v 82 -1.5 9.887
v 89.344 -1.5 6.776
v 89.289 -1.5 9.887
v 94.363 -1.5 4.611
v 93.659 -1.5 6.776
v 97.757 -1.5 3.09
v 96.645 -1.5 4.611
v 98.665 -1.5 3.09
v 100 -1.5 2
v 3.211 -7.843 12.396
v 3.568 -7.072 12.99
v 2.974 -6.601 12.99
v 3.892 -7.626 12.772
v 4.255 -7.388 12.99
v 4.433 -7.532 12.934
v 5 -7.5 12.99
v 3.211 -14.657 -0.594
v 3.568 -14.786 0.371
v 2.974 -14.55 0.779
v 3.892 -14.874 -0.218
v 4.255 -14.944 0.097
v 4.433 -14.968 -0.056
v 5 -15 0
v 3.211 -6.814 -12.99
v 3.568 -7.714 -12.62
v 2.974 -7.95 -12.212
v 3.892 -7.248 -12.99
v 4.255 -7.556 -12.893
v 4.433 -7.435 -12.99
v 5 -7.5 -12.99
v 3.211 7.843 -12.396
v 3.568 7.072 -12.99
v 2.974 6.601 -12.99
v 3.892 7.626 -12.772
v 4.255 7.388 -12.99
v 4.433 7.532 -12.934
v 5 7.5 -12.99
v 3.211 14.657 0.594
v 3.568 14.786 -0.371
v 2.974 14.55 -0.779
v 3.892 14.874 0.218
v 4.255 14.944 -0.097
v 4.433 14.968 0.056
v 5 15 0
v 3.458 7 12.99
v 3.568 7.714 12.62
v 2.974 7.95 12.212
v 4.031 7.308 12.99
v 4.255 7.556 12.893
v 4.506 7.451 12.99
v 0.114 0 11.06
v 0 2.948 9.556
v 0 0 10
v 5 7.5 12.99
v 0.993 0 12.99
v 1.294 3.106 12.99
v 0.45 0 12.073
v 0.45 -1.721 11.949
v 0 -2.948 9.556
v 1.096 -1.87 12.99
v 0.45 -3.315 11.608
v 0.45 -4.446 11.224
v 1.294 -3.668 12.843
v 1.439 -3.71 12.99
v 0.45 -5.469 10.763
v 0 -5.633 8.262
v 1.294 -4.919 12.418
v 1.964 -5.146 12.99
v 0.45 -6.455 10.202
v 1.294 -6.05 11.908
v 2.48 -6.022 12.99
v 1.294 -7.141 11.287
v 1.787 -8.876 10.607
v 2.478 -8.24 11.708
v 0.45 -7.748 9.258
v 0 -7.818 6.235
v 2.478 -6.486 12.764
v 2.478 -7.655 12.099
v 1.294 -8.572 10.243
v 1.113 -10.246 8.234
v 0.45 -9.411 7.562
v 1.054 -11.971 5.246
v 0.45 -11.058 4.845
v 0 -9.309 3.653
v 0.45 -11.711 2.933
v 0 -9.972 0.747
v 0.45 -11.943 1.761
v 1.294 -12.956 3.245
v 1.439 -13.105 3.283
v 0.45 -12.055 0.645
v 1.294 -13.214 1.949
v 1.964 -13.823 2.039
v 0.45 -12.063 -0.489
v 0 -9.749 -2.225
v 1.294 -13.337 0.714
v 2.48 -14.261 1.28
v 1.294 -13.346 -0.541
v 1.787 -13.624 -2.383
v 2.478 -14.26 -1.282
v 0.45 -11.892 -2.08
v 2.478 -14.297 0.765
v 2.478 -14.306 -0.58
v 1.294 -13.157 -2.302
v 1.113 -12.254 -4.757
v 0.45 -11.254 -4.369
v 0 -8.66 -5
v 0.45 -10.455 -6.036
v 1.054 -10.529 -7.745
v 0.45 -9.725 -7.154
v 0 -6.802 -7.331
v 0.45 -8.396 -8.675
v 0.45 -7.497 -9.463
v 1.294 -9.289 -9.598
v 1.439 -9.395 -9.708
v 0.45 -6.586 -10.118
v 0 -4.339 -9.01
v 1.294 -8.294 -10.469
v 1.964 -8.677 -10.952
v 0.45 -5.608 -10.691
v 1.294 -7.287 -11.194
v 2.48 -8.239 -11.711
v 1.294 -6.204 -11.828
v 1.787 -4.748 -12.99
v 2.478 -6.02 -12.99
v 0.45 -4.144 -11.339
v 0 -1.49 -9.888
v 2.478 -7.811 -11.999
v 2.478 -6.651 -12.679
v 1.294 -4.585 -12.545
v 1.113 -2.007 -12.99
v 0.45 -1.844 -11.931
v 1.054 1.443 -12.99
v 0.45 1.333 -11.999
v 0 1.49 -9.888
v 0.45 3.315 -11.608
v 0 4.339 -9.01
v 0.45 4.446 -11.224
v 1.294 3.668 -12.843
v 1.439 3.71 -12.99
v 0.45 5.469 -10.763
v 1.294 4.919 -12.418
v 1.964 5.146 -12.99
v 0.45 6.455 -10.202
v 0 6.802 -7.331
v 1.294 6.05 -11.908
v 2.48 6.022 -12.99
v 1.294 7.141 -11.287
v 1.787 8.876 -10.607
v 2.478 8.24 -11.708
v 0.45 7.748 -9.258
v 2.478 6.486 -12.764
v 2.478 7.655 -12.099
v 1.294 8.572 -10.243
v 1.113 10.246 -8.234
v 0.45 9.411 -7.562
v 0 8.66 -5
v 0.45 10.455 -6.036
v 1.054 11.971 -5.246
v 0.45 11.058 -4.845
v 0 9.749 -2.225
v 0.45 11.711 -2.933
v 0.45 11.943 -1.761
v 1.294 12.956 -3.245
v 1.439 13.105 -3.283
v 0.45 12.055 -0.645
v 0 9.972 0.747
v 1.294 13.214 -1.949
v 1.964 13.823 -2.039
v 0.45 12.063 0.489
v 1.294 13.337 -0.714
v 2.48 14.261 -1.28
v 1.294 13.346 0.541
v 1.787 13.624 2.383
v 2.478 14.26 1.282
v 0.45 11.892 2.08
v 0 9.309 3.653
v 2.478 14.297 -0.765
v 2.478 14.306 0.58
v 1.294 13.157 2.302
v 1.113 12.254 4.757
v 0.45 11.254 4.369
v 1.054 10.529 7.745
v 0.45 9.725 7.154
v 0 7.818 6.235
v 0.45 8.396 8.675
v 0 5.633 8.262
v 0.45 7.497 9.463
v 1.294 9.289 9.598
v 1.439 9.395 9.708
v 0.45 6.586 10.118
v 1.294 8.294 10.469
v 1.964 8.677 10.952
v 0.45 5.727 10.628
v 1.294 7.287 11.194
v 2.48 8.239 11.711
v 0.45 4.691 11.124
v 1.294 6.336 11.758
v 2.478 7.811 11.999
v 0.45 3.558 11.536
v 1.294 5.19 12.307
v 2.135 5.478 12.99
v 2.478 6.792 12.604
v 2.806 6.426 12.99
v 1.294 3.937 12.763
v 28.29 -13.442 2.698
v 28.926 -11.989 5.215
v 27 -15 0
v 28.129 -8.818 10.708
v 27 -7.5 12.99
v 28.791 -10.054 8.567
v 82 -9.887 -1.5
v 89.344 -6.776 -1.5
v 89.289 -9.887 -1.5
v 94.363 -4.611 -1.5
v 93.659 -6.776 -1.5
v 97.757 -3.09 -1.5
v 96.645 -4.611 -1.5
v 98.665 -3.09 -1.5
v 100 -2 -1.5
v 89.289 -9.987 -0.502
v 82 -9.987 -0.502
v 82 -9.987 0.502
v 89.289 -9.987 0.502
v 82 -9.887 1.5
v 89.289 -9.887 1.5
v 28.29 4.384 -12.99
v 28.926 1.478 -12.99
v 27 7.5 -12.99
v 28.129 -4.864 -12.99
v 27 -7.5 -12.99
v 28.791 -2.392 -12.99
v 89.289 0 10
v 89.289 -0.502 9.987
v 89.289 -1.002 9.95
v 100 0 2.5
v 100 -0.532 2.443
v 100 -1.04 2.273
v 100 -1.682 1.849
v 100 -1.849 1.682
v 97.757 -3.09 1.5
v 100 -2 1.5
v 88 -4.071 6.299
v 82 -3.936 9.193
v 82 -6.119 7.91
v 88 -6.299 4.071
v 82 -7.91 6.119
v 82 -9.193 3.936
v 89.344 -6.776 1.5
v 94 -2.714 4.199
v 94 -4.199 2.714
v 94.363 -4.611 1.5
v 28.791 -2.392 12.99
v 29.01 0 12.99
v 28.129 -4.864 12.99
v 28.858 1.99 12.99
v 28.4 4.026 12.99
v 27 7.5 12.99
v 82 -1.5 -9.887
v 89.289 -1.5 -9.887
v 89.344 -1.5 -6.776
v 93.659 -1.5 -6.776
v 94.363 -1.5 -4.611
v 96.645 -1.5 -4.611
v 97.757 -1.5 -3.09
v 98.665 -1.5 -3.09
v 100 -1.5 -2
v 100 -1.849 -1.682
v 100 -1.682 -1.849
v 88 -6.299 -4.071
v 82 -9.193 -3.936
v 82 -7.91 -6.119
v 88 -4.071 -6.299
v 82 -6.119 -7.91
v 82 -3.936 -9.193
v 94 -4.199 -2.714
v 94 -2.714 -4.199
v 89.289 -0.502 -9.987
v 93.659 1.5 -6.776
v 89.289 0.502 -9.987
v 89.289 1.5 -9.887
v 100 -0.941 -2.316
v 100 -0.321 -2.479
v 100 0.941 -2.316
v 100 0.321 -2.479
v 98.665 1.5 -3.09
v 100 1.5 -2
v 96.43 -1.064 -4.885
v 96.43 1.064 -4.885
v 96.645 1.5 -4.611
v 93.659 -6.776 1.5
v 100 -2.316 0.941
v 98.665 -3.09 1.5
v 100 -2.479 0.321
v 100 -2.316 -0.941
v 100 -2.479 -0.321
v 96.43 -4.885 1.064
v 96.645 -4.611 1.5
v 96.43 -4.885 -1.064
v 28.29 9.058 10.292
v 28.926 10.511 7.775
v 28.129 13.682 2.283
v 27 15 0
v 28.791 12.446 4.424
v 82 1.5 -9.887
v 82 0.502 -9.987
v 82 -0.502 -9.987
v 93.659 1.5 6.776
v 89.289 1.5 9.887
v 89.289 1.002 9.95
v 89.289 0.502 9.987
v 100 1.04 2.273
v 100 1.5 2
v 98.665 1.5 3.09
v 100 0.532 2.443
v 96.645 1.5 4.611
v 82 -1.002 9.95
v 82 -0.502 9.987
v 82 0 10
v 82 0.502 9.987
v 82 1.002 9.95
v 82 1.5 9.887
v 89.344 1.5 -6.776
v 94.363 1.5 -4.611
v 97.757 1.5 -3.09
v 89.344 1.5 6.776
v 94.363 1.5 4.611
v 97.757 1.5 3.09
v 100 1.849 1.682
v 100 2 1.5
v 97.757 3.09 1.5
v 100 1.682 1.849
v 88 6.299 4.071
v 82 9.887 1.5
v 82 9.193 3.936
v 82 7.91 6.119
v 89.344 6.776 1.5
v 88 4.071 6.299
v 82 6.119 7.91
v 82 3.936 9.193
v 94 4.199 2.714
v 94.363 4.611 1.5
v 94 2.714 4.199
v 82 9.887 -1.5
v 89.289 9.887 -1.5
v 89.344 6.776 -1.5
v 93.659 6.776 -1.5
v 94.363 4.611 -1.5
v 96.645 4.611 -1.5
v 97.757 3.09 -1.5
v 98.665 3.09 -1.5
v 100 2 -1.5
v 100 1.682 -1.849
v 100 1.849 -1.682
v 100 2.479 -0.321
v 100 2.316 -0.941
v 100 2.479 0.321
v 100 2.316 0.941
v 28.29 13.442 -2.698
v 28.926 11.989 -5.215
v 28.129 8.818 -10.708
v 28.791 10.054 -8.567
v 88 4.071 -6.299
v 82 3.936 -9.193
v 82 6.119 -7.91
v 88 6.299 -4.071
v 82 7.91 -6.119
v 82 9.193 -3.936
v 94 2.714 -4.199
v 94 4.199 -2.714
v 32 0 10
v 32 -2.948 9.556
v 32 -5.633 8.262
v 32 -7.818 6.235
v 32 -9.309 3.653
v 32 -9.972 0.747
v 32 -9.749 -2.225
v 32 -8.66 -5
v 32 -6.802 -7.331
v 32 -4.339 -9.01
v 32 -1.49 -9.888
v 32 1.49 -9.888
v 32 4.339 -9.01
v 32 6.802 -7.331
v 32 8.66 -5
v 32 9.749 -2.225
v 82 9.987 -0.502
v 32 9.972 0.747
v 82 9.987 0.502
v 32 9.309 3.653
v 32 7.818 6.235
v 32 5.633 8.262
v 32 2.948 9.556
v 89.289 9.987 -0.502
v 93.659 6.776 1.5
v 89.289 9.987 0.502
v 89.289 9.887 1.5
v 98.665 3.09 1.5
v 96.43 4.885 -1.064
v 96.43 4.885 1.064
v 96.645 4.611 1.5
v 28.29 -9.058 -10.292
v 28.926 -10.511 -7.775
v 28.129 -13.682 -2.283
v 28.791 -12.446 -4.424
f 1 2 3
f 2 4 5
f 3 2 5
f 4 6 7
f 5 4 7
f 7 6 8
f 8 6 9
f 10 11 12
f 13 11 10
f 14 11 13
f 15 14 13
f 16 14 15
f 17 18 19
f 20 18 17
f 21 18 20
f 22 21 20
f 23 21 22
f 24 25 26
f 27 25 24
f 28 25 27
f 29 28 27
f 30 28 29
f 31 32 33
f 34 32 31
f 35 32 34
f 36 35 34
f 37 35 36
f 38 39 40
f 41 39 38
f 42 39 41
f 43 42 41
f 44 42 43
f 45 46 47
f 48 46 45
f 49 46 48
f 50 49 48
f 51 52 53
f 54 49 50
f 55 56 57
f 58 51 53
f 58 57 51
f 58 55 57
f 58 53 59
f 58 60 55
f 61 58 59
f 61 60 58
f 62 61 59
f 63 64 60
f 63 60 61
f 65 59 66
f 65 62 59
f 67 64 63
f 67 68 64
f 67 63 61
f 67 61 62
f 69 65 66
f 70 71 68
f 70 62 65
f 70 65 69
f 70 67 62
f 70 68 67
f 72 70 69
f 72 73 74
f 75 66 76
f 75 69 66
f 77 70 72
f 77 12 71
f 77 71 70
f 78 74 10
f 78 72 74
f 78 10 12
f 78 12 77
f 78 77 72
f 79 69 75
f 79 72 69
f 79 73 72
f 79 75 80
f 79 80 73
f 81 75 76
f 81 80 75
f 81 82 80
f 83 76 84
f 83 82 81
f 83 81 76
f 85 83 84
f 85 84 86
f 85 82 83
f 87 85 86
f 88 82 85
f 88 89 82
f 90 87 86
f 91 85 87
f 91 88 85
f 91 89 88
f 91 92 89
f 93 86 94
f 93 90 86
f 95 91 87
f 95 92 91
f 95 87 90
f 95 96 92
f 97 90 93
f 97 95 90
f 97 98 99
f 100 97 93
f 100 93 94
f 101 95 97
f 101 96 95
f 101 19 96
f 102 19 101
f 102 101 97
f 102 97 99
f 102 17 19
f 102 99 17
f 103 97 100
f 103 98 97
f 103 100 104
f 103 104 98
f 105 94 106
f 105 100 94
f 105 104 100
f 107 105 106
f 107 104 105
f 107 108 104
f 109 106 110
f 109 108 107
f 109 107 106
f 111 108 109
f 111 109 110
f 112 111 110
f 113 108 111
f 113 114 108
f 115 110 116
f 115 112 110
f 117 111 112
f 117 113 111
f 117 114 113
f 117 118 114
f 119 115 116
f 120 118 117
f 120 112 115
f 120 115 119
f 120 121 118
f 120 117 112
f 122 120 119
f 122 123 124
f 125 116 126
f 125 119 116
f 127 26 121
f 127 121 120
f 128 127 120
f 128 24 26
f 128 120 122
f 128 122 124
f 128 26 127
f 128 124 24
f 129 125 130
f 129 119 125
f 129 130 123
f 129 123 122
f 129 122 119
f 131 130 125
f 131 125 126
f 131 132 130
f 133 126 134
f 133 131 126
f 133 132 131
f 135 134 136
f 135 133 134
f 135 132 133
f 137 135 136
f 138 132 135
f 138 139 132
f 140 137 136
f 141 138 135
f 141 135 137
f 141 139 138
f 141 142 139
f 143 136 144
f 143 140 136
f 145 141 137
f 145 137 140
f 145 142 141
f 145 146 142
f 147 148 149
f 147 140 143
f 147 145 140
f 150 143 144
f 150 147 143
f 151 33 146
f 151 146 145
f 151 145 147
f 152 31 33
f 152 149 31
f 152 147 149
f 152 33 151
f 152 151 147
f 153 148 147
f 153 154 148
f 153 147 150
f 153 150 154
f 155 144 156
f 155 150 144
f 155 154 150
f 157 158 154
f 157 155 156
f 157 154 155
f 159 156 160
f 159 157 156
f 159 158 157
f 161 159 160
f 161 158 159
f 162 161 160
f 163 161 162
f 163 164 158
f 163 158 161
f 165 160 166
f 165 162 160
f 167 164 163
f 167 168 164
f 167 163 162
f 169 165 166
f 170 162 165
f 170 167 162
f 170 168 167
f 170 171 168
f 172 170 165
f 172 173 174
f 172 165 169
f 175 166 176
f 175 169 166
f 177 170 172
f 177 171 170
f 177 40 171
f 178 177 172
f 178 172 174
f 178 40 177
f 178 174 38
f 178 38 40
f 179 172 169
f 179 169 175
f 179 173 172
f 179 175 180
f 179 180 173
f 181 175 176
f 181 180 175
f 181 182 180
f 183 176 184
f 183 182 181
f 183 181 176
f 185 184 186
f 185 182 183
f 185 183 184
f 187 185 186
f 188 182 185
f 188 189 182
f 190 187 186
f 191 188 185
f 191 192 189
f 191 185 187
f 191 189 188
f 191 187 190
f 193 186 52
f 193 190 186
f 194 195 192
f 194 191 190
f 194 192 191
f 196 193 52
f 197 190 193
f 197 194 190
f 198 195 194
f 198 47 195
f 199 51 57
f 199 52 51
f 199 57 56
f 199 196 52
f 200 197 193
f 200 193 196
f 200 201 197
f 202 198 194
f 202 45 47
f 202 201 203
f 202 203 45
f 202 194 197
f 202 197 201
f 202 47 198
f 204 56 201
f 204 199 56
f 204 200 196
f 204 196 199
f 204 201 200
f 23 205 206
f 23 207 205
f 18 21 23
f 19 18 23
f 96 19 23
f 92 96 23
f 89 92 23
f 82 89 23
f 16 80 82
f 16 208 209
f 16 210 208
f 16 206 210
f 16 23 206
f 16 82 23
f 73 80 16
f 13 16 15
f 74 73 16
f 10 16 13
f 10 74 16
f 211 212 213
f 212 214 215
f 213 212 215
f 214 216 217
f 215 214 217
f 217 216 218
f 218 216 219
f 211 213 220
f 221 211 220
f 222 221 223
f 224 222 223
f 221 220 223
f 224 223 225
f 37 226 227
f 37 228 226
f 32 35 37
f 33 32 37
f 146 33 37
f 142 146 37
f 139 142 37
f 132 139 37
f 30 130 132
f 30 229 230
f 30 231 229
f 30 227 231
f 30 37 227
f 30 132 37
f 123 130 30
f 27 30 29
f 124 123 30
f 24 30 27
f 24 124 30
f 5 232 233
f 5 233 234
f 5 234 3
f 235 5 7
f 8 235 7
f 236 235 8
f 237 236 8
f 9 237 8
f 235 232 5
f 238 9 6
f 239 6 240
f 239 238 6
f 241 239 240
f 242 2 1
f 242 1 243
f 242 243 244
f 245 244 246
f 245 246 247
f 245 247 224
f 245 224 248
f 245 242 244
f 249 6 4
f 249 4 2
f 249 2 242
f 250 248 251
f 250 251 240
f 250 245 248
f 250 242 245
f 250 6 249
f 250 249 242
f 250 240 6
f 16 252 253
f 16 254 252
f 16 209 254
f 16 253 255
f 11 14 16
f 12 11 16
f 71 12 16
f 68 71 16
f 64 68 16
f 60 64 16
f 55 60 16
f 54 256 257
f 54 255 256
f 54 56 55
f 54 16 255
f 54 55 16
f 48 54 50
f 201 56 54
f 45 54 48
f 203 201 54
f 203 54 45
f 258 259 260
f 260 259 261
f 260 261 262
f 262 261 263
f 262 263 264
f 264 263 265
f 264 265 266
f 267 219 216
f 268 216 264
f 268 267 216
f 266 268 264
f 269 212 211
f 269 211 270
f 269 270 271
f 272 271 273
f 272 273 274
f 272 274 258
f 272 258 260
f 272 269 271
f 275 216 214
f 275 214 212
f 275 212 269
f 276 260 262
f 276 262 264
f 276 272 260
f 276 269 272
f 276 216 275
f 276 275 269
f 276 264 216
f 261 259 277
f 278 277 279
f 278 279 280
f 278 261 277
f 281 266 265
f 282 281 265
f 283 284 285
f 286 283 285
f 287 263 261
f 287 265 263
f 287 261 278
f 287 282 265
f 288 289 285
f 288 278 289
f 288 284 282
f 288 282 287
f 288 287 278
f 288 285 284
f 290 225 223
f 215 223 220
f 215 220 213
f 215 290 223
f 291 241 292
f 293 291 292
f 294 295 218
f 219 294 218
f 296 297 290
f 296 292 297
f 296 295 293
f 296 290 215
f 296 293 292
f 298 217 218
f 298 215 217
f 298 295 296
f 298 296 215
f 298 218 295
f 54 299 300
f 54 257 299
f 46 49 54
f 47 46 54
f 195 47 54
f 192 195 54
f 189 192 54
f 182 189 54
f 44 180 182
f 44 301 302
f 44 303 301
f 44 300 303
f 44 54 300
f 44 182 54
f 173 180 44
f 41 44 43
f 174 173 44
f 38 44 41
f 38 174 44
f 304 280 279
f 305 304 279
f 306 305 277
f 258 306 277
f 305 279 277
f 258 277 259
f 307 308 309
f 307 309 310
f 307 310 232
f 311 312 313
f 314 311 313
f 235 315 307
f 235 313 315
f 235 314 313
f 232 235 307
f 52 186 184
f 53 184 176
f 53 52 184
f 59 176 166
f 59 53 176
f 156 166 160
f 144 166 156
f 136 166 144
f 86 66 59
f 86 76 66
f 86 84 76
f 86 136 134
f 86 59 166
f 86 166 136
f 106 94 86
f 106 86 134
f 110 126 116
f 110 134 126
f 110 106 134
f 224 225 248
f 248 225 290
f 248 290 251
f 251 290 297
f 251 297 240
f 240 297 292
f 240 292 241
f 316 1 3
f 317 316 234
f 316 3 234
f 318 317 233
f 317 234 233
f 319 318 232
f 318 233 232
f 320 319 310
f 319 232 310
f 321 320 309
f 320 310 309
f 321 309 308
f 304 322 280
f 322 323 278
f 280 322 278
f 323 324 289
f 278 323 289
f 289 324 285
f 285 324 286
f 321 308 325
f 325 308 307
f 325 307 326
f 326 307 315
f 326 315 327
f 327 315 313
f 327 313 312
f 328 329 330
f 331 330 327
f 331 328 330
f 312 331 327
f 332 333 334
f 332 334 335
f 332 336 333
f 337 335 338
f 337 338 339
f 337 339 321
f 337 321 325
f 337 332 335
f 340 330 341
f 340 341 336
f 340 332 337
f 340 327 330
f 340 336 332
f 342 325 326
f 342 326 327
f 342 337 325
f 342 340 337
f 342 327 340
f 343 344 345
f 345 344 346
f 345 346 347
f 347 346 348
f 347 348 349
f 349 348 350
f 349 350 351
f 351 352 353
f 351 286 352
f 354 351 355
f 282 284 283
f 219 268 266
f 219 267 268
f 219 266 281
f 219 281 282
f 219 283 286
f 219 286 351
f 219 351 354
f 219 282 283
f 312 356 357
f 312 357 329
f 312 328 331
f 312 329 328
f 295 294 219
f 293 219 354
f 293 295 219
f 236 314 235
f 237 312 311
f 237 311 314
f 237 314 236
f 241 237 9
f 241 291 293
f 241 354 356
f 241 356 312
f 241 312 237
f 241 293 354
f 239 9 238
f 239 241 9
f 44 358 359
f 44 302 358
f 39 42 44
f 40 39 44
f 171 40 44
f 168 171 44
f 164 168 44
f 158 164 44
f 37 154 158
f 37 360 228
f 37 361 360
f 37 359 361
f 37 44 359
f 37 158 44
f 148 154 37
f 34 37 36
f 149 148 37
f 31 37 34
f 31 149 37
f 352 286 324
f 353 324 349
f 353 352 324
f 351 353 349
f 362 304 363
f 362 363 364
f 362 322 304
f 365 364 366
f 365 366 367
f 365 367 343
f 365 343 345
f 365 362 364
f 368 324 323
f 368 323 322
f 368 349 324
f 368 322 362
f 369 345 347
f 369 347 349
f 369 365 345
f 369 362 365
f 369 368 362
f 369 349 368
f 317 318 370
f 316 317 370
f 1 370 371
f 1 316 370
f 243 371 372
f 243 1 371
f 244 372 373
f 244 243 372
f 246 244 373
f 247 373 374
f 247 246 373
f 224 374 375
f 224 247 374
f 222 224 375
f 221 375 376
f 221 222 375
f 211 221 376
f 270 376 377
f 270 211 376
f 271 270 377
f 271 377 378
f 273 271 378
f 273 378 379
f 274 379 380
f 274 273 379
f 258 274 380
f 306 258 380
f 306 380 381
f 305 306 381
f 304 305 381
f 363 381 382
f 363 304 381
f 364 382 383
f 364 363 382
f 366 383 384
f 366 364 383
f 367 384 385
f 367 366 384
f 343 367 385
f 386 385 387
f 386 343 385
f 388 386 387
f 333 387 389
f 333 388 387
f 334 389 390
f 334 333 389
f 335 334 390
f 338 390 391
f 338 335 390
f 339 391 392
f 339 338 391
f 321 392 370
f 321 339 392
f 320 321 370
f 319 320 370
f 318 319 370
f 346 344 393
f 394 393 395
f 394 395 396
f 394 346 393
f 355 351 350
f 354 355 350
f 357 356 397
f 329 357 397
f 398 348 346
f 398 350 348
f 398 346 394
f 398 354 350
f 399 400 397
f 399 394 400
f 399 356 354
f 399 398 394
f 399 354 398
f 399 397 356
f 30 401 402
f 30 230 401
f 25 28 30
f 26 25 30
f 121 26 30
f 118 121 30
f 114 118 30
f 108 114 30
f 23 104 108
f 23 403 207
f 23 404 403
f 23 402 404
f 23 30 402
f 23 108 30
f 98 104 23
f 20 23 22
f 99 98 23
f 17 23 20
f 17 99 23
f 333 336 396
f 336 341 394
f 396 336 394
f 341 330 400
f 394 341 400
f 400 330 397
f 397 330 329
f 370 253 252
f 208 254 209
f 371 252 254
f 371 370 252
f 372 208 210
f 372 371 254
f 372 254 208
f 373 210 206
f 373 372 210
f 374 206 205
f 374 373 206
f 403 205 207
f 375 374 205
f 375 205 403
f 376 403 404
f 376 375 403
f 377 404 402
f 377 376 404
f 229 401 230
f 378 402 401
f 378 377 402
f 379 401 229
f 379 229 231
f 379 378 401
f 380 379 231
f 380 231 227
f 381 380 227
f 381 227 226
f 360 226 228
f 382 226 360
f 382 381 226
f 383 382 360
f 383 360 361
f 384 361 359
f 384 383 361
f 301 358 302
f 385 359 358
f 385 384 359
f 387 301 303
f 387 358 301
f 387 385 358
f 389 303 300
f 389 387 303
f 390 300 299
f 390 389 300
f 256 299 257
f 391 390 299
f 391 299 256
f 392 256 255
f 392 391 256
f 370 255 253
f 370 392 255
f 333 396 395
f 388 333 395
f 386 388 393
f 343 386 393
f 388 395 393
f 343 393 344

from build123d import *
from build123d.topology import SkipClean

# Parameters (mm, degrees)
SKETCH2_OUTSIDE_W   = 53.726
SKETCH2_OUTSIDE_H   = 53.726
CUT_EXTRUDE2_DEPTH  = 100
BOSS_EXTRUDE1_DEPTH = 18


with BuildPart() as part:
    # Sketch1 → Revolve1 (revolve)
    with BuildSketch(Plane(origin=(0, 0, 0), x_dir=(1, 0, 0), z_dir=(0, 0, -1)), mode=Mode.PRIVATE) as revolve1_sk:
        with BuildLine():
            Line((0, 0), (0, 10))
            ThreePointArc((0, 10), (1.464466094, 13.535533906), (5, 15))
            Line((5, 15), (27, 15))
            Line((27, 15), (32, 10))
            Line((32, 10), (82, 10))
            Line((82, 10), (100, 2.5))
            Line((100, 2.5), (100, 0))
            Line((100, 0), (0, 0))
        make_face()
    revolve(revolve1_sk.sketch.rotate(Axis((-28.136645963, 0, 0), (1, 0, 0)), 270), axis=Axis((-28.136645963, 0, 0), (1, 0, 0)))  # turned: the seam where the file's is

    # Sketch2 outside → Cut-Extrude2 (cut)
    with BuildSketch(Plane.ZY):
        Rectangle(SKETCH2_OUTSIDE_W, SKETCH2_OUTSIDE_H)
        Polygon((12.990381057, -7.5), (12.990381057, 7.5), (0, 15), (-12.990381057, 7.5), (-12.990381057, -7.5), (0, -15), align=None, mode=Mode.SUBTRACT)
    extrude(amount=-CUT_EXTRUDE2_DEPTH, mode=Mode.SUBTRACT)

    # Sketch5 → Boss-Extrude1 (add)
    with SkipClean():  # keep this step's faces unmerged: merging them makes the solid invalid here
        with BuildSketch(Plane(origin=(100, 0, 0), x_dir=(0, 0, -1), z_dir=(1, 0, 0))):
            with BuildLine():
                Line((-1.5, 2), (-1.5, 9.886859967))
                ThreePointArc((-1.5, 9.886859967), (0, 10), (1.5, 9.886859967))
                Line((1.5, 9.886859967), (1.5, 2))
                ThreePointArc((1.5, 2), (1.767766953, 1.767766953), (2, 1.5))
                Line((2, 1.5), (9.886859967, 1.5))
                ThreePointArc((9.886859967, 1.5), (10, 0), (9.886859967, -1.5))
                Line((9.886859967, -1.5), (2, -1.5))
                ThreePointArc((2, -1.5), (1.767766953, -1.767766953), (1.5, -2))
                Line((1.5, -2), (1.5, -9.886859967))
                ThreePointArc((1.5, -9.886859967), (0, -10), (-1.5, -9.886859967))
                Line((-1.5, -9.886859967), (-1.5, -2))
                ThreePointArc((-1.5, -2), (-1.767766953, -1.767766953), (-2, -1.5))
                Line((-2, -1.5), (-9.886859967, -1.5))
                ThreePointArc((-9.886859967, -1.5), (-10, 0), (-9.886859967, 1.5))
                Line((-9.886859967, 1.5), (-2, 1.5))
                ThreePointArc((-2, 1.5), (-1.767766953, 1.767766953), (-1.5, 2))
            make_face()
        extrude(amount=-BOSS_EXTRUDE1_DEPTH)

    # Sketch6 → Cut-Revolve1 (revolve, cut)
    with SkipClean():  # keep this step's faces unmerged: merging them makes the solid invalid here
        with BuildSketch(Plane.XY, mode=Mode.PRIVATE) as cut_revolve1_sk:
            Polygon((100, 2.5), (100, 10), (89.288889949, 10), align=None)
        revolve(cut_revolve1_sk.sketch.rotate(Axis((100, 0, 0), (1, 0, 0)), 90), axis=Axis((100, 0, 0), (1, 0, 0)), mode=Mode.SUBTRACT)  # turned: the seam where the file's is


solid = part.part
